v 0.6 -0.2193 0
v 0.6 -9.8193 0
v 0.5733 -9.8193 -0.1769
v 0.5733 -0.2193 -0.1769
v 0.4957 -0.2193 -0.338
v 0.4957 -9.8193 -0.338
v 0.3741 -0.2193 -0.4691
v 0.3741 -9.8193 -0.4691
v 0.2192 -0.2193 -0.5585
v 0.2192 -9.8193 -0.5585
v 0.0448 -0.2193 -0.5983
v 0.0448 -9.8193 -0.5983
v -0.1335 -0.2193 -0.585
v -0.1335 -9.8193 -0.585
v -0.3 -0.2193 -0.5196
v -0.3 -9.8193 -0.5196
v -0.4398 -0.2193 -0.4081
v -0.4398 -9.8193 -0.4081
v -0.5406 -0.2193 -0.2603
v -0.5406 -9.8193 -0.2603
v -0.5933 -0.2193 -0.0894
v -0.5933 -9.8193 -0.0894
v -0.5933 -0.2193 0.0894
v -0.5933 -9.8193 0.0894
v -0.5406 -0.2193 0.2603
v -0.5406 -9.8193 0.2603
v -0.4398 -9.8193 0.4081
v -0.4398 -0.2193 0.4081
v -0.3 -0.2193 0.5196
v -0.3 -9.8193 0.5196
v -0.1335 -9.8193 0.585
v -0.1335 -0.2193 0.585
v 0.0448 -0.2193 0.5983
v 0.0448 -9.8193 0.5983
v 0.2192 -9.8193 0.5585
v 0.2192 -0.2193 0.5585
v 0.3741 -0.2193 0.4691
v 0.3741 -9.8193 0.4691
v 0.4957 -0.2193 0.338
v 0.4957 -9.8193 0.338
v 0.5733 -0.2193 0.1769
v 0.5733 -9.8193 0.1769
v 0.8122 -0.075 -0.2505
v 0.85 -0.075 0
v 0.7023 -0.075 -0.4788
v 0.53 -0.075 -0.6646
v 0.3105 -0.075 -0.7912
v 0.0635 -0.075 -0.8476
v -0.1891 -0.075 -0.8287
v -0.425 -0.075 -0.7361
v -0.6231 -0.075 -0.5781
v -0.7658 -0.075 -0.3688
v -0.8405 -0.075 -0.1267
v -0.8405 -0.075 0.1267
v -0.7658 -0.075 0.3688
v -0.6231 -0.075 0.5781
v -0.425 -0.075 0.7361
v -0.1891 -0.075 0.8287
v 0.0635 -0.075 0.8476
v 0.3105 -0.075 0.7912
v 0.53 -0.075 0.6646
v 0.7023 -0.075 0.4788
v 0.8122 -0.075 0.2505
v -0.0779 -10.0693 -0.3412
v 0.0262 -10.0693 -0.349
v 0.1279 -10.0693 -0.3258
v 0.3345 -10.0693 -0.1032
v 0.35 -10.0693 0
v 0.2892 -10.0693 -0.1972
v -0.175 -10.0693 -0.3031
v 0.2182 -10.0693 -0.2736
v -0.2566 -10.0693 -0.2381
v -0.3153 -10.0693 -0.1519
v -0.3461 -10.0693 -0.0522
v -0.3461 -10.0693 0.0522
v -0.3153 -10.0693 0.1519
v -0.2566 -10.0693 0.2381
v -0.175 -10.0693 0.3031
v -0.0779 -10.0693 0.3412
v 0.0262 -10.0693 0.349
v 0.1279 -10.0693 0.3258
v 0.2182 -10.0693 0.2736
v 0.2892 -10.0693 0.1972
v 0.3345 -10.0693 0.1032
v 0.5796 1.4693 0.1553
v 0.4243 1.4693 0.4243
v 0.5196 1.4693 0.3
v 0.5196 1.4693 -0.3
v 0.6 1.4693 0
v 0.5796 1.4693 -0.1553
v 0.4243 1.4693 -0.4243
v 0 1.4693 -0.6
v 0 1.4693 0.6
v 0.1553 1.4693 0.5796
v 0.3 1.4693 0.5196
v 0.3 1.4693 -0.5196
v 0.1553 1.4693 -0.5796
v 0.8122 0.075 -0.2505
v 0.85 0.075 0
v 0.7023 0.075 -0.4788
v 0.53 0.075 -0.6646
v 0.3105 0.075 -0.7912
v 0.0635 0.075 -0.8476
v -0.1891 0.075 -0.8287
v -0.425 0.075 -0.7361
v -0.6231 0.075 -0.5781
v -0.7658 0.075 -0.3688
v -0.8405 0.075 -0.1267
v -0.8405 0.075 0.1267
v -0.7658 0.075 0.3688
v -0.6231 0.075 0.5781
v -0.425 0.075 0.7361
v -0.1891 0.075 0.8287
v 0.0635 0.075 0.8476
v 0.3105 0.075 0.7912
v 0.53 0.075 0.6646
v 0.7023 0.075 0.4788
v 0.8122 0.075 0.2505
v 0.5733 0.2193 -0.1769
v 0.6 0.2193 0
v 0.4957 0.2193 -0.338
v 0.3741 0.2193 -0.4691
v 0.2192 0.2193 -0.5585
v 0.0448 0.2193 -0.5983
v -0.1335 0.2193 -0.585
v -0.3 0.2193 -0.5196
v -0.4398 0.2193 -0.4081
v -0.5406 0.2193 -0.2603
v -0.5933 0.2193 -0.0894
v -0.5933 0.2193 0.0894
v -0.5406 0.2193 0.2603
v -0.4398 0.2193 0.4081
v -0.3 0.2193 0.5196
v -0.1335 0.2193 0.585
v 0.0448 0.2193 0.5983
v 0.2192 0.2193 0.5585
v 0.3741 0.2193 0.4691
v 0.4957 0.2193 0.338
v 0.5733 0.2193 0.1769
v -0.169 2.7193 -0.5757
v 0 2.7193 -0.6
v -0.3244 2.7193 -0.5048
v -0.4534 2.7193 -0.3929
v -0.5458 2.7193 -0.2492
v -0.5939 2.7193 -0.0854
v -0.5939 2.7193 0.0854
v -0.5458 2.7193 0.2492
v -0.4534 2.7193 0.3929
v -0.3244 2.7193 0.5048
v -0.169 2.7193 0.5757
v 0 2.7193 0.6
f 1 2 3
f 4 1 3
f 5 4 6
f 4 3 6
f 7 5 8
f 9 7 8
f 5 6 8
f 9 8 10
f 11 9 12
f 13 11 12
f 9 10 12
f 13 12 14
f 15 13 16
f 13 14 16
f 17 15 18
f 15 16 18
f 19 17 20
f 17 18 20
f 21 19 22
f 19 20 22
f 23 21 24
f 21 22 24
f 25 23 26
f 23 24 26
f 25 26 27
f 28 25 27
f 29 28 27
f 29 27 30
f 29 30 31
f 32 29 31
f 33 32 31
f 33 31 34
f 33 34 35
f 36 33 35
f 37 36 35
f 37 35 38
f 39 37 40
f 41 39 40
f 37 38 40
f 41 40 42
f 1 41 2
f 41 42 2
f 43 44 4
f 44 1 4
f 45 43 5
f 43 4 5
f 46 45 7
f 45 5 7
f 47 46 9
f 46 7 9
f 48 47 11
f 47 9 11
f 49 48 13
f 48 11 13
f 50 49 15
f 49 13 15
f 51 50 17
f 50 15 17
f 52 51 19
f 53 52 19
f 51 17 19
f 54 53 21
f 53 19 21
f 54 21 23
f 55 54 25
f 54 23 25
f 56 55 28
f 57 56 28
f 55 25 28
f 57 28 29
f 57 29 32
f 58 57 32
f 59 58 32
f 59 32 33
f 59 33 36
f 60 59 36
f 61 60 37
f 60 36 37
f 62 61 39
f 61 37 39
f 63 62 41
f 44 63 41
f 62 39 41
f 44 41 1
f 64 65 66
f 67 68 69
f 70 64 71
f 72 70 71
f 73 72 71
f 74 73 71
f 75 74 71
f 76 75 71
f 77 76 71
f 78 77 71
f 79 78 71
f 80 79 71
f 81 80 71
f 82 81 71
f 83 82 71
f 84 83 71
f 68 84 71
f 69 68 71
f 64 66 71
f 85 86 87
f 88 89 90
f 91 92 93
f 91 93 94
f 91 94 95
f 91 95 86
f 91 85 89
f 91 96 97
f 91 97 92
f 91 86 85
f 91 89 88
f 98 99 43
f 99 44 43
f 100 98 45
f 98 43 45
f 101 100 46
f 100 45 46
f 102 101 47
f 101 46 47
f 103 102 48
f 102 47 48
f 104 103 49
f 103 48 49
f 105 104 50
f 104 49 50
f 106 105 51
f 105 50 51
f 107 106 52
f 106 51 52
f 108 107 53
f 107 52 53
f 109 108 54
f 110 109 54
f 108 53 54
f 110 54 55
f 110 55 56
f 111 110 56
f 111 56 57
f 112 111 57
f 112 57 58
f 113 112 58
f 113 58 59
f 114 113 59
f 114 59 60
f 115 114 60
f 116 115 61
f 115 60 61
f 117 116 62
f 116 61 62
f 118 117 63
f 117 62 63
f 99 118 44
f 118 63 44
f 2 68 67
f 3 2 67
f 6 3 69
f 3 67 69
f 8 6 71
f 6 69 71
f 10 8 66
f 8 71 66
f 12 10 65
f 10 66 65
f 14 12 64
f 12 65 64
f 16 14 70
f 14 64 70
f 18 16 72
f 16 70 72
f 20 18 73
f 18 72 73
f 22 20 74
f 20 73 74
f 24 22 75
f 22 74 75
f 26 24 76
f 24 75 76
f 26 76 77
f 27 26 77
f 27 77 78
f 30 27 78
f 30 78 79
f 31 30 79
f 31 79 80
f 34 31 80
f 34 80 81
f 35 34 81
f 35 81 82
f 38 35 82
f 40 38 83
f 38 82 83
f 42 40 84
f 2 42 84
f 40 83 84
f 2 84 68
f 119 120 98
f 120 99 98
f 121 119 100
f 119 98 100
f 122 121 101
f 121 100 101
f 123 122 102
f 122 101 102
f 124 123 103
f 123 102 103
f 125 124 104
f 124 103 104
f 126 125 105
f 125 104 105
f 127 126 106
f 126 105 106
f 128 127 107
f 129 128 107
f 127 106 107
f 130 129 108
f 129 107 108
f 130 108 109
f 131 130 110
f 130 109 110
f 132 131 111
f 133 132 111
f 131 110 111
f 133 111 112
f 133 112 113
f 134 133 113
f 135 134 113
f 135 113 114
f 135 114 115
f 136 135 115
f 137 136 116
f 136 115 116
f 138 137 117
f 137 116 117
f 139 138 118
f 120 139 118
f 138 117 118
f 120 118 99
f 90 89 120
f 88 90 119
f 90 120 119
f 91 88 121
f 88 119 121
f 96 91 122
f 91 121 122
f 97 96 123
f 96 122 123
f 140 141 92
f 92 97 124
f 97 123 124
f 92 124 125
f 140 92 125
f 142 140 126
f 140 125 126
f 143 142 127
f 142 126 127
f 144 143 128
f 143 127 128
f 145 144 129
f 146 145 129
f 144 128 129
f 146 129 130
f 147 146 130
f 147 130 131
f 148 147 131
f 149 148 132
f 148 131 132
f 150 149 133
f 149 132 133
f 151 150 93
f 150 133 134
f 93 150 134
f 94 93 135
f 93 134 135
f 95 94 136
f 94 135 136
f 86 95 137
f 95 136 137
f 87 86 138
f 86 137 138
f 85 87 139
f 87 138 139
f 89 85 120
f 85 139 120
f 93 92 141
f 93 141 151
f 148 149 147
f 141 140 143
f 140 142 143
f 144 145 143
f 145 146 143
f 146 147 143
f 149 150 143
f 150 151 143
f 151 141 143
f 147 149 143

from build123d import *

# Parameters (mm, degrees)
CUT_EXTRUDE1_START = -1.25
CUT_EXTRUDE1_DEPTH = 1.25
CHAMFER1_SIZE      = 0.25


with BuildPart() as part:
    # Sketch1 → Revolve1 (revolve)
    with BuildSketch(Plane.XY):
        Polygon((0, 0), (0, 2.719337567), (0.6, 2.719337567), (0.6, 0.219337567), (0.85, 0.075), (0.85, -0.075), (0.6, -0.219337567), (0.6, -10.069337567), (0, -10.069337567), align=None)
    revolve(axis=Axis((0, 0, 0), (0, 1, 0)))

    # Sketch2 → Cut-Extrude1 (cut)
    with BuildSketch(Plane(origin=(0, 2.719337567, 0), x_dir=(1, 0, 0), z_dir=(0, 1, 0)).offset(CUT_EXTRUDE1_START)):
        with BuildLine():
            Line((0, 0.6), (0, -0.6))
            ThreePointArc((0, -0.6), (0.6, 0), (0, 0.6))
        make_face()
    extrude(amount=CUT_EXTRUDE1_DEPTH, mode=Mode.SUBTRACT)

    # Chamfer1
    chamfer1_edges = [part.edges().sort_by_distance(p)[0] for p in [
        (-0.6, -10.069337567, 0),
    ]]
    chamfer(chamfer1_edges, length=CHAMFER1_SIZE)


solid = part.part
